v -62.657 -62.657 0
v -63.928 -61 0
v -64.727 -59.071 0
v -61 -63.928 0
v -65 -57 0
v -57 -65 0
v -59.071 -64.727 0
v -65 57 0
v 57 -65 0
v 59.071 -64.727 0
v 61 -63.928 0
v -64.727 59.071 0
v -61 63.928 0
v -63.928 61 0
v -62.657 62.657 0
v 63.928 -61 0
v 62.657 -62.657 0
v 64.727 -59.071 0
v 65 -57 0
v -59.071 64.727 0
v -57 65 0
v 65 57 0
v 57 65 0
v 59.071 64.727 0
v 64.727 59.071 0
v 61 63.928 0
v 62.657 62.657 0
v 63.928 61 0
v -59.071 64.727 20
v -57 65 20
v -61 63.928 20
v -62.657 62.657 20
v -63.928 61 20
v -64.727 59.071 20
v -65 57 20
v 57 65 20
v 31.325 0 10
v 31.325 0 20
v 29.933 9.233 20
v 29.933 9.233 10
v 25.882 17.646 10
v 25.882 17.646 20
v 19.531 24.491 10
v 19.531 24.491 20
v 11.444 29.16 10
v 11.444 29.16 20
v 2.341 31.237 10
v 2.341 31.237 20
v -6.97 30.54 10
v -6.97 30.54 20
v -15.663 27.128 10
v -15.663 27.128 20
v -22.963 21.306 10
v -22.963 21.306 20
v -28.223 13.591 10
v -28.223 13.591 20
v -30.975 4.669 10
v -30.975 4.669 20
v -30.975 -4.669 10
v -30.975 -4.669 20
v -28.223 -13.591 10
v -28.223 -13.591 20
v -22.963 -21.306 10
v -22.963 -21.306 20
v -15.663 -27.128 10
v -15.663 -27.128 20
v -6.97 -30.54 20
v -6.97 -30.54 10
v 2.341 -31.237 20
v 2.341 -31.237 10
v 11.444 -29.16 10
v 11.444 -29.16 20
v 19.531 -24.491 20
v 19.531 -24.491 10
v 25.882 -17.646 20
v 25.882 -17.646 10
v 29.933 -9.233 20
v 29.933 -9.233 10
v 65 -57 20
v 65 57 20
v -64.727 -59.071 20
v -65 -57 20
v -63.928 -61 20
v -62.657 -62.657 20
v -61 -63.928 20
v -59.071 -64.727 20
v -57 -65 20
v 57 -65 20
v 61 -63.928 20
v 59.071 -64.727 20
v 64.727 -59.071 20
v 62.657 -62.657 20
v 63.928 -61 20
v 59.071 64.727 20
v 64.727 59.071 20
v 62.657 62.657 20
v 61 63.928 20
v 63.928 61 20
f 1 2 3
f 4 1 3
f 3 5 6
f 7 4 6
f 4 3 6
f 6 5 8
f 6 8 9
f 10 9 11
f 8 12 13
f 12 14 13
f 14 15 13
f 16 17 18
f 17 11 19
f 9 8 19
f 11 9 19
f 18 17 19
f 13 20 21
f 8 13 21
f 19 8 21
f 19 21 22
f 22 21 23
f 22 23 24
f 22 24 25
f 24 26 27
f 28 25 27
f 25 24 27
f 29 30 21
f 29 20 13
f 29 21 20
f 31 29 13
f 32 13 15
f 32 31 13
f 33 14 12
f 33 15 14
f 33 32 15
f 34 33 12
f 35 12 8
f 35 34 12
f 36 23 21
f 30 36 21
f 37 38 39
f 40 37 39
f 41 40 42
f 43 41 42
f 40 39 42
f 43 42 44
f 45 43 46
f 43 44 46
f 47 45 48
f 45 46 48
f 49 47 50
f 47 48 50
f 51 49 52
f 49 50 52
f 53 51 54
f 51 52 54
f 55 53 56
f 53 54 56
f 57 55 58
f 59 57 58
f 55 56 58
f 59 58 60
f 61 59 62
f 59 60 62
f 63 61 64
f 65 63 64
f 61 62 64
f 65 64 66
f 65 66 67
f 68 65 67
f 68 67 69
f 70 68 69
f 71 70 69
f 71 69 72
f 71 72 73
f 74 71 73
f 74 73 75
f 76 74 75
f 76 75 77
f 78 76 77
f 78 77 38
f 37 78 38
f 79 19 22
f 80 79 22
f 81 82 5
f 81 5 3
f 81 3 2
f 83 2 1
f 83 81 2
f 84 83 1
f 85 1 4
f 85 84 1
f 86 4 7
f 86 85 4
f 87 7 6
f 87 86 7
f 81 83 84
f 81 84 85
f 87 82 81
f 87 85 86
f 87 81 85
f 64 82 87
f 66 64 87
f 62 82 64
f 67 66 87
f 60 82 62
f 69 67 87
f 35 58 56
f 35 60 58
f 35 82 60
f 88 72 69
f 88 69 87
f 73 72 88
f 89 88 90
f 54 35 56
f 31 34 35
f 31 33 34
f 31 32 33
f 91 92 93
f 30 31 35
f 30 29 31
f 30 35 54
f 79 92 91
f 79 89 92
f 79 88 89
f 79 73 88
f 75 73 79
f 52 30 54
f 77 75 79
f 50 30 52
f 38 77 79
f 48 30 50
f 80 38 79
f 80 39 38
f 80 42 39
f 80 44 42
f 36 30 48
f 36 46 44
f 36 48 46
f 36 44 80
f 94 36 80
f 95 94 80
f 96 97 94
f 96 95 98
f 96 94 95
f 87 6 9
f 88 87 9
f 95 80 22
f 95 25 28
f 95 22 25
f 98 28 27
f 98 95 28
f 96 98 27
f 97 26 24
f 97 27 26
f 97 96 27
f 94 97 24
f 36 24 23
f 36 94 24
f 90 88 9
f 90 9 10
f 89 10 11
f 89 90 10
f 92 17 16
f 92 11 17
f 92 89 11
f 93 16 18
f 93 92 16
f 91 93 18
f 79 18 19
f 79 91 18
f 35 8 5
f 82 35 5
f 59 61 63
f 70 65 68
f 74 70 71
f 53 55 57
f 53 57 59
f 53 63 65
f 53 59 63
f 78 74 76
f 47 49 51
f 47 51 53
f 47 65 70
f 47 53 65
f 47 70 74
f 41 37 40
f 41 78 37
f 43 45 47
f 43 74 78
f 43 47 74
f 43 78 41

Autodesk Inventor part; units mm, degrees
ref_plane "YZ Plane" through (0, 0, 0) normal (1, 0, 0) x (0, 1, 0)
ref_plane "XZ Plane" through (0, 0, 0) normal (0, 1, 0) x (-1, 0, 0)
ref_plane "XY Plane" through (0, 0, 0) normal (0, 0, 1) x (1, 0, 0)
sketch "Sketch1" plane through (0, 0, 0) normal (0, 0, 1) x (1, 0, 0)
  line L0 (-65, -65) -> (65, -65)
  line L1 (65, -65) -> (65, 65)
  line L2 (65, 65) -> (-65, 65)
  line L3 (-65, 65) -> (-65, -65)
  line L4 (-65, -65) -> (65, 65) construction
  line L5 (65, -65) -> (-65, 65) construction
  point P0 (0, 0)
  dimension "d0" = 130
  dimension "d1" = 130
extrude "Extrusion1" add sketch "Sketch1" along normal blind 20
fillet "Fillet1" radius 8 4 edges at (65, -65, 10) (65, 65, 10) (-65, -65, 10) (-65, 65, 10)
sketch "Sketch2" plane through (0, 0, 20) normal (0, 0, 1) x (1, 0, 0)
  circle A0 centre (0, 0) radius 31.325
  dimension "d7" = 62.65
extrude "Extrusion2" cut sketch "Sketch2" against normal blind 10
